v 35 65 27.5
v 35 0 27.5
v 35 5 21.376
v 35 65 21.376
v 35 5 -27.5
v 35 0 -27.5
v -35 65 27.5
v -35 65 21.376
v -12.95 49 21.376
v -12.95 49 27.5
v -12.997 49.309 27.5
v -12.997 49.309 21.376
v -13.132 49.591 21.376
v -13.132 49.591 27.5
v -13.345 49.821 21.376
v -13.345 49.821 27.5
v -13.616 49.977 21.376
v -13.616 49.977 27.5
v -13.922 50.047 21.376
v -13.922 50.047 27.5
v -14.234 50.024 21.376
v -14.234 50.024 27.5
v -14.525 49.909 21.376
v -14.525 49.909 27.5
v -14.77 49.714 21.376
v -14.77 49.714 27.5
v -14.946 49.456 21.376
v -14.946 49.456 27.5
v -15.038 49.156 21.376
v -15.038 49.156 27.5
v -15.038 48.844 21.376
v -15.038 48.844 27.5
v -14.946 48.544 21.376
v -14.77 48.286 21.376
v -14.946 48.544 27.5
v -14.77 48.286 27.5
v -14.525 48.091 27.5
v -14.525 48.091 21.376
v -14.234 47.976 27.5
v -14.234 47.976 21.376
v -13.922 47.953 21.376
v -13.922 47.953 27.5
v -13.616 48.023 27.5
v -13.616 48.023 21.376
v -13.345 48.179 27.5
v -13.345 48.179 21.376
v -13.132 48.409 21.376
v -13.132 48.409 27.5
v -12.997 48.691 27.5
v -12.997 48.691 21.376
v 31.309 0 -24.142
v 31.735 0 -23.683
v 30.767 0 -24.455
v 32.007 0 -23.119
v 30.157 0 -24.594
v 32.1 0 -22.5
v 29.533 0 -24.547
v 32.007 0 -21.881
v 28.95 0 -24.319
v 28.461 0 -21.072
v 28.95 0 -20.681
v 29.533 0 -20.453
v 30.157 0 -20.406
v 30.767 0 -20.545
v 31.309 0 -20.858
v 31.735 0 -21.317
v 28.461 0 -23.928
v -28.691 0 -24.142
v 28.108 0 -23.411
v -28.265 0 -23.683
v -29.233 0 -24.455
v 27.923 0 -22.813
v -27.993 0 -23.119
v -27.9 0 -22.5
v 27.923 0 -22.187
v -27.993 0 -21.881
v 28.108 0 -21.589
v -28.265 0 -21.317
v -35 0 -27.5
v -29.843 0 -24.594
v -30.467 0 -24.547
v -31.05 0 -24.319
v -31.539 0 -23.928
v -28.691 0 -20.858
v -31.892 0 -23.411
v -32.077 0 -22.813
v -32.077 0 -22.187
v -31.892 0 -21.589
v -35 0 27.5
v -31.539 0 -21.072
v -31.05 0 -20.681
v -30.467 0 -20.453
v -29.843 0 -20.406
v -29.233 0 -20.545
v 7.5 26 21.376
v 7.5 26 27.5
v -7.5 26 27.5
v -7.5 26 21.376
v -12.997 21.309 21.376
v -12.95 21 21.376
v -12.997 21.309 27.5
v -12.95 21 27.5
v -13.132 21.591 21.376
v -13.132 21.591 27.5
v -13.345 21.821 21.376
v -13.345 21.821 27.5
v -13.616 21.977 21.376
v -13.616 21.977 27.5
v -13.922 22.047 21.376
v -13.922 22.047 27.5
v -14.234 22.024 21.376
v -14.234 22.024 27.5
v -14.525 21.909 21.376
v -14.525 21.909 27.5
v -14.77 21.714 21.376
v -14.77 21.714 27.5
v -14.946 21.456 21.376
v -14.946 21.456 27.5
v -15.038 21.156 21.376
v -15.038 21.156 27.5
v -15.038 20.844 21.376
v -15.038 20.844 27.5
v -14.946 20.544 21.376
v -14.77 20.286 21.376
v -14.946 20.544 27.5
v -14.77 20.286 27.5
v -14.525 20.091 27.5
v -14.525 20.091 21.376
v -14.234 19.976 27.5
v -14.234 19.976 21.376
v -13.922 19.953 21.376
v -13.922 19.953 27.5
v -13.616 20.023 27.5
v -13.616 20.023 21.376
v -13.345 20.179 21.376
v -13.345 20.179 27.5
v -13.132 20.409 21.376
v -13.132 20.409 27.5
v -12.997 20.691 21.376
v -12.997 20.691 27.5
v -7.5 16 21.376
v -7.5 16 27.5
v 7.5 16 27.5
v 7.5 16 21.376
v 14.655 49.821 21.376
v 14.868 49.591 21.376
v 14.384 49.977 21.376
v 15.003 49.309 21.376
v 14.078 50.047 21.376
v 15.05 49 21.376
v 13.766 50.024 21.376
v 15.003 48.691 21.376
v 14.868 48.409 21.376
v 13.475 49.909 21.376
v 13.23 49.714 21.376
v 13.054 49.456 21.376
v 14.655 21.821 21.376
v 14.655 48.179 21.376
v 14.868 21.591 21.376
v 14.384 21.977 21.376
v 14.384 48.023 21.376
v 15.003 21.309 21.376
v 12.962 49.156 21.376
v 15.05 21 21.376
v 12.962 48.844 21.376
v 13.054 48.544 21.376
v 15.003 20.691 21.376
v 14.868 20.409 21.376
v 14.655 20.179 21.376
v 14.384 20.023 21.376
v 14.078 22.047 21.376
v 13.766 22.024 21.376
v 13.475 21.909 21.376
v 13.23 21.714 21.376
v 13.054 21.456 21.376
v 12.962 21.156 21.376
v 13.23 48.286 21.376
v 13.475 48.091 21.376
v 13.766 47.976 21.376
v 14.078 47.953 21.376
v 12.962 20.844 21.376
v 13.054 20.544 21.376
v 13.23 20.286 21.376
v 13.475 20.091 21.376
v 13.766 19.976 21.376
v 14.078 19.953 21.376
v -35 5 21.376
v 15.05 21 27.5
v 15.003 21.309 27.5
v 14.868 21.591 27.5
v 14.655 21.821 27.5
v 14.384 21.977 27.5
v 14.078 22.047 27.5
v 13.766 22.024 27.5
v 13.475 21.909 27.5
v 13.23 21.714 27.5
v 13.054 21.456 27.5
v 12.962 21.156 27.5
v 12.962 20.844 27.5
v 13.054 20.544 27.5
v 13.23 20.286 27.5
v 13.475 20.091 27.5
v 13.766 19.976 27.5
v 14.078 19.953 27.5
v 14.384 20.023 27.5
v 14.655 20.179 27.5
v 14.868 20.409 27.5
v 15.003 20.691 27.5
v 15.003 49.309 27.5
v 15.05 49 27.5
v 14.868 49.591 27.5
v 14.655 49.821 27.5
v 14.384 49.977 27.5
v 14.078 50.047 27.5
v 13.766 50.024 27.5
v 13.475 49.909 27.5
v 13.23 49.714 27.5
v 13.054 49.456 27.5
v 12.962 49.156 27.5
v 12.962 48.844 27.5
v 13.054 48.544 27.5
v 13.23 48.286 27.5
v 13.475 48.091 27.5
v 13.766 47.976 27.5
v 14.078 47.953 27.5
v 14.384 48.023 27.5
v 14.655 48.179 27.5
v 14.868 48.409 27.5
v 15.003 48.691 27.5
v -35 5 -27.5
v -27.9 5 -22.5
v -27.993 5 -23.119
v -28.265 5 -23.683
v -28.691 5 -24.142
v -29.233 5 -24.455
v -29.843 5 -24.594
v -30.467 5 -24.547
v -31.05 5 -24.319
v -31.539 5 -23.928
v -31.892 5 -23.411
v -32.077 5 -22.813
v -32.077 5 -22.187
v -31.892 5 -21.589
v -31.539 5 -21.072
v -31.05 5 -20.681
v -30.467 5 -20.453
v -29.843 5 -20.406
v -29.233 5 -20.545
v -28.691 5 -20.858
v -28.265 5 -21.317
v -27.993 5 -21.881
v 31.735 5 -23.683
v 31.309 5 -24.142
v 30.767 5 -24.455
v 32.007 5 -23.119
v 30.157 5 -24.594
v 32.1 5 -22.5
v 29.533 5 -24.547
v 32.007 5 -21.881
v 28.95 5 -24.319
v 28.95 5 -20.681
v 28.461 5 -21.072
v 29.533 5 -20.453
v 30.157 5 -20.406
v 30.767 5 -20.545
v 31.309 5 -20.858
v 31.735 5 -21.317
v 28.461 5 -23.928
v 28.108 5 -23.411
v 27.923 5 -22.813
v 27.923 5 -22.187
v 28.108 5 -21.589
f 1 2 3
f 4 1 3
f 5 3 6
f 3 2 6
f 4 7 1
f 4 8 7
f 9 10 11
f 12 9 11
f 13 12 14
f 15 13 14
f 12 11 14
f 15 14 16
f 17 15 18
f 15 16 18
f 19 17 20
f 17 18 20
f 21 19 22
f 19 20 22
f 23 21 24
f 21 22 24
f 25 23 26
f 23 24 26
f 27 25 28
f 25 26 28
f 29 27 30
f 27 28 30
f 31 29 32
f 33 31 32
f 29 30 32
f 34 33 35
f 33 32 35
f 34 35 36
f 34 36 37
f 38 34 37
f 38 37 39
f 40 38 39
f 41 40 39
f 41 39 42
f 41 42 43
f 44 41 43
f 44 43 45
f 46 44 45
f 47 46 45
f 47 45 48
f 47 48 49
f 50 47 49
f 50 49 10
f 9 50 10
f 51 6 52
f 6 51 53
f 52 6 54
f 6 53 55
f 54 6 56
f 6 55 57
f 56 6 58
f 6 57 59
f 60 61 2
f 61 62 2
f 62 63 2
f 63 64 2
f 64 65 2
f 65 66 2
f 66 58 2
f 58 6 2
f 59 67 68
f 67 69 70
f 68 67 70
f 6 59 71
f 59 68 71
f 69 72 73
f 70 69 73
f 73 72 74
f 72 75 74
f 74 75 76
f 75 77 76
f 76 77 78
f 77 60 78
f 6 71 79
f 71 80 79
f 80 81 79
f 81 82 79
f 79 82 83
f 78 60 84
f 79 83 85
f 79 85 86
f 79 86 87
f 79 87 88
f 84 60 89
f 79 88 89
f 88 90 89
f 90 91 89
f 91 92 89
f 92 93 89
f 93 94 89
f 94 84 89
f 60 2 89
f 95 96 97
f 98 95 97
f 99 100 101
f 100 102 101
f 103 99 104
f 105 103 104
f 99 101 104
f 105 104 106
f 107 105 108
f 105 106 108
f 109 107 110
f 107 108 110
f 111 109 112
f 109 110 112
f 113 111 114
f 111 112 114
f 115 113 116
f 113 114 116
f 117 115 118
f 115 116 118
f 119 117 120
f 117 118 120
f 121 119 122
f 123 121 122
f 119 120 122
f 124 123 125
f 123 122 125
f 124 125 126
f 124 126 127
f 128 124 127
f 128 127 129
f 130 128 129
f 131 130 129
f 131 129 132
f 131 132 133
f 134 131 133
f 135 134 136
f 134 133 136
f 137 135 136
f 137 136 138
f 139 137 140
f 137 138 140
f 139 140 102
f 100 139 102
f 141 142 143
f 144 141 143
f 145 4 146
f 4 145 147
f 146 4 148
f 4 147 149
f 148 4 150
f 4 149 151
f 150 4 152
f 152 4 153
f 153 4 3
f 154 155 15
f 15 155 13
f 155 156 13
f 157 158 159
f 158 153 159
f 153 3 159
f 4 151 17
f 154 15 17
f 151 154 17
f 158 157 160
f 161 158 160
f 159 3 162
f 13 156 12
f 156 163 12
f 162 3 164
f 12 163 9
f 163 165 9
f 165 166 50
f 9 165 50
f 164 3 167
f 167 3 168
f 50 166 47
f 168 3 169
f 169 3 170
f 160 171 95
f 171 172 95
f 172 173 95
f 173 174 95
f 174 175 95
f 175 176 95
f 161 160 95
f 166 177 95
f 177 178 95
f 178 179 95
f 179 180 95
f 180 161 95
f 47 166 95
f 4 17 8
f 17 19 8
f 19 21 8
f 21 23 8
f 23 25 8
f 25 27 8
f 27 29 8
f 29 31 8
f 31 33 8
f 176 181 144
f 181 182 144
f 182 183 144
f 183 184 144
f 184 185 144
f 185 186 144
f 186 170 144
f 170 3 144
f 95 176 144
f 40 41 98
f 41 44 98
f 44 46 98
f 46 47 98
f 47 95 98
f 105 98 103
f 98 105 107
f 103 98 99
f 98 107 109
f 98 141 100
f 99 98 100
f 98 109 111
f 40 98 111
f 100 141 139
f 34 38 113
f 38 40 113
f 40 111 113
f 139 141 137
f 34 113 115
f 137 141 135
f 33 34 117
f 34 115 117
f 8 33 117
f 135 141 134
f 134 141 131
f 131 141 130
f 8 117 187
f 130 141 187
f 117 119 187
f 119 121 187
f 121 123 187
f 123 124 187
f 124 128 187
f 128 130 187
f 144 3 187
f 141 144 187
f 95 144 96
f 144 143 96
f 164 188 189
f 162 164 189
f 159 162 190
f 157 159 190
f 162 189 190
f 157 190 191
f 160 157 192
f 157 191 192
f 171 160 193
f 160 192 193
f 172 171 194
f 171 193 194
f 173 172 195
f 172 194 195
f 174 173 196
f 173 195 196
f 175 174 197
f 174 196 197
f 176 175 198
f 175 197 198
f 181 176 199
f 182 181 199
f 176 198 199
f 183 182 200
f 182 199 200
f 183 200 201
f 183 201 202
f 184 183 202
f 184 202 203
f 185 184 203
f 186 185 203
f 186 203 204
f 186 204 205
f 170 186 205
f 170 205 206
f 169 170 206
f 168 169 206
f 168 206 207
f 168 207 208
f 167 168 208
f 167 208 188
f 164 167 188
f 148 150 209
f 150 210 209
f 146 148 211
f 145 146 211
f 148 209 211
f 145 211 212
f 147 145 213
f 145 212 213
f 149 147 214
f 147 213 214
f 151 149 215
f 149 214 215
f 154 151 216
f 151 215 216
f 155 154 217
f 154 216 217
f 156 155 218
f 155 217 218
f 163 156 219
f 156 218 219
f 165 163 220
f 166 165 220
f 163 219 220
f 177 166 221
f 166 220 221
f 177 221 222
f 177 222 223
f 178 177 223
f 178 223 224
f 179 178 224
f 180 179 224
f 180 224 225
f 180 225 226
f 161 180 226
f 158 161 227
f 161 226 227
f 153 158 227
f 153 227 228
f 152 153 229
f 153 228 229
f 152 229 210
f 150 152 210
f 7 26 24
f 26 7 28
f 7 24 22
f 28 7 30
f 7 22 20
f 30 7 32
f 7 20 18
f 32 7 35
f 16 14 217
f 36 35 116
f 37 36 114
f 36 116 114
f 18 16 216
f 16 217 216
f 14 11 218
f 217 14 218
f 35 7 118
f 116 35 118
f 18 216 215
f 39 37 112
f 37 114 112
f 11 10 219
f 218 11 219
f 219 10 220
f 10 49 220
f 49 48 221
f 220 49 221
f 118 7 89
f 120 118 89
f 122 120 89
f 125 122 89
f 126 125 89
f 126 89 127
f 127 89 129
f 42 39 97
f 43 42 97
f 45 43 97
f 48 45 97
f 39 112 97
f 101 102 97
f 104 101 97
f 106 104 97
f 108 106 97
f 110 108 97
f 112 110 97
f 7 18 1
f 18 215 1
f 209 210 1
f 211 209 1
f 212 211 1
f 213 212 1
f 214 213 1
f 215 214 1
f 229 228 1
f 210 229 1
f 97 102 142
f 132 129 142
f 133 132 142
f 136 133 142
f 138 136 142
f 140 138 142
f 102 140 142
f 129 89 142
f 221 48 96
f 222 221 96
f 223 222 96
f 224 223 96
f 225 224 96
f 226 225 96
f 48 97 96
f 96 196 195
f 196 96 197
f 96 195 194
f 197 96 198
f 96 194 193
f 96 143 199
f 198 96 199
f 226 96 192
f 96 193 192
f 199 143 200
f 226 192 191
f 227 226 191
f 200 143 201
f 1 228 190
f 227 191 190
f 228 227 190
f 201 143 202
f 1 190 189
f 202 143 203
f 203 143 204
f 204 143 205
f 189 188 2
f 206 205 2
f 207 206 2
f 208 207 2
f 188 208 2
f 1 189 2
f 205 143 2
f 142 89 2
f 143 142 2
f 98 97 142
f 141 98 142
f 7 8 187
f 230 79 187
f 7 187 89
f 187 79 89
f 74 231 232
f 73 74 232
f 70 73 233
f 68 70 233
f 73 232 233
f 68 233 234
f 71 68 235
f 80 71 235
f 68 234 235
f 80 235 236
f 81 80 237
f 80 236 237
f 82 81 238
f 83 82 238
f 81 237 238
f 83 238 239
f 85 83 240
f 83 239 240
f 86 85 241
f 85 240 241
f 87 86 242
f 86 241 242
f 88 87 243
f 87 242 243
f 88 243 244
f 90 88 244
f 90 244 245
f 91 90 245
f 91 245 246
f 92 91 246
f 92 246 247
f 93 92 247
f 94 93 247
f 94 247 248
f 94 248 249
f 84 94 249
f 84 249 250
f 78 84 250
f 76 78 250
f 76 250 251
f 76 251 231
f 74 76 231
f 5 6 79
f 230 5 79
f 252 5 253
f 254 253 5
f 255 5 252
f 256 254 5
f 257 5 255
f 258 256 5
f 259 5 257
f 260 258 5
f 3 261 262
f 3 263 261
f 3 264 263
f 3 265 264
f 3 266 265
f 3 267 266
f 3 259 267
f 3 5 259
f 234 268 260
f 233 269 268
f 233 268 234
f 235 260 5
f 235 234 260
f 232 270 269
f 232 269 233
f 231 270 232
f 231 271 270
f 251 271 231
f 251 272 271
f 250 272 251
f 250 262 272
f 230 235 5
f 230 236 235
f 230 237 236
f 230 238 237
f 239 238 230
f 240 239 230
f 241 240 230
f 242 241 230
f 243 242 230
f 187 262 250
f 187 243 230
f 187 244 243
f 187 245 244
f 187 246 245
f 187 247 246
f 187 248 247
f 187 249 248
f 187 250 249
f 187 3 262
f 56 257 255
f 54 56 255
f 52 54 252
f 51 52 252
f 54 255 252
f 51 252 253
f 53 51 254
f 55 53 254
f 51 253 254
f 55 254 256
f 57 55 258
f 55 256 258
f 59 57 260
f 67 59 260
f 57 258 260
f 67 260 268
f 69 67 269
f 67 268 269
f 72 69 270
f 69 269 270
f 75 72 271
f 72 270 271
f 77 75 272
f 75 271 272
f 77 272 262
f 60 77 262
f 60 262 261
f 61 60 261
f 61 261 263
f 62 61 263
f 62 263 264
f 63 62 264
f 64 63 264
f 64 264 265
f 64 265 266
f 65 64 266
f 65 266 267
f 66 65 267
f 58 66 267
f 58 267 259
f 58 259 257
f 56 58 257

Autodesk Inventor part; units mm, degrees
ref_plane "YZ Plane" through (0, 0, 0) normal (1, 0, 0) x (0, 1, 0)
ref_plane "XZ Plane" through (0, 0, 0) normal (0, 1, 0) x (-1, 0, 0)
ref_plane "XY Plane" through (0, 0, 0) normal (0, 0, 1) x (1, 0, 0)
sketch "Sketch1" plane through (0, 0, 0) normal (0, 1, 0) x (-1, 0, 0)
  line L0 (35, 27.5) -> (-35, 27.5)
  line L1 (-35, 27.5) -> (-35, -27.5)
  line L2 (-35, -27.5) -> (35, -27.5)
  line L3 (35, -27.5) -> (35, 27.5)
  line L4 (35, 27.5) -> (-35, -27.5) construction
  line L5 (-35, 27.5) -> (35, -27.5) construction
  point P0 (0, 0)
  dimension "d0" = 70
  dimension "d1" = 55
extrude "Extrusion1" add sketch "Sketch1" along normal blind 5
sketch "Sketch2" plane through (0, 5, 0) normal (0, 1, 0) x (1, 0, 0)
  circle A0 centre (-30, 22.5) radius 2.1
  circle A1 centre (30, 22.5) radius 2.1
  line L0 (35, 27.5) -> (-35, 27.5) projected
  line L1 (-35, 27.5) -> (-35, -27.5) projected
  line L2 (35, -27.5) -> (35, 27.5) projected
  point P0 (0, 0)
  dimension "d4" = 4.2
  dimension "d5" = 4.2
  dimension "d6" = 5
  dimension "d7" = 5
  dimension "d8" = 5
  dimension "d9" = 5
extrude "Extrusion2" cut sketch "Sketch2" against normal blind 5
sketch "Sketch3" plane through (0, 5, 0) normal (0, 1, 0) x (1, 0, 0)
  line L0 (-35, -27.5) -> (35, -27.5)
  line L1 (35, -27.5) -> (35, -21.3758)
  line L2 (35, -21.3758) -> (-35, -21.3758)
  line L3 (-35, -21.3758) -> (-35, -27.5)
  line L4 (-35, -27.5) -> (35, -21.3758) construction
  line L5 (35, -27.5) -> (-35, -21.3758) construction
  line L6 (-35, -27.5) -> (35, -27.5) projected
  line L7 (35, -27.5) -> (35, 27.5) projected
  line L8 (-35, 27.5) -> (-35, -27.5) projected
  point P0 (0, 0)
  point P1 (0, -24.4379)
  dimension "d12" = 5
extrude "Extrusion3" add sketch "Sketch3" along normal blind 60
sketch "Sketch4" plane through (-35, 0, 27.5) normal (0, 0, 1) x (1, 0, 0)
  circle A0 centre (21, 49) radius 1.05
  circle A1 centre (49, 49) radius 1.05
  circle A2 centre (21, 21) radius 1.05
  circle A3 centre (49, 21) radius 1.05
  line L0 (0, 0) -> (70, 0) projected
  line L1 (70, 0) -> (70, 65) projected
  line L2 (0, 0) -> (0, 65) projected
  point P0 (35, 0)
  dimension "d15" = 2.1
  dimension "d16" = 2.1
  dimension "d17" = 2.1
  dimension "d18" = 2.1
  dimension "d19" = 21
  dimension "d20" = 21
  dimension "d21" = 21
  dimension "d22" = 28
extrude "Extrusion4" cut sketch "Sketch4" against normal blind 50
sketch "Sketch5" plane through (-35, 0, 27.5) normal (0, 0, 1) x (1, 0, 0)
  line L0 (27.5, 16) -> (42.5, 16)
  line L1 (42.5, 16) -> (42.5, 26)
  line L2 (42.5, 26) -> (27.5, 26)
  line L3 (27.5, 26) -> (27.5, 16)
  line L4 (27.5, 16) -> (42.5, 26) construction
  line L5 (42.5, 16) -> (27.5, 26) construction
  line L6 (0, 0) -> (70, 0) projected
  point P0 (35, 0)
  point P1 (35, 21)
  point P2 (35, 0)
  dimension "d25" = 15
  dimension "d26" = 10
  dimension "d27" = 21
extrude "Extrusion5" cut sketch "Sketch5" against normal blind 50
properties part number "camera_bottom"
